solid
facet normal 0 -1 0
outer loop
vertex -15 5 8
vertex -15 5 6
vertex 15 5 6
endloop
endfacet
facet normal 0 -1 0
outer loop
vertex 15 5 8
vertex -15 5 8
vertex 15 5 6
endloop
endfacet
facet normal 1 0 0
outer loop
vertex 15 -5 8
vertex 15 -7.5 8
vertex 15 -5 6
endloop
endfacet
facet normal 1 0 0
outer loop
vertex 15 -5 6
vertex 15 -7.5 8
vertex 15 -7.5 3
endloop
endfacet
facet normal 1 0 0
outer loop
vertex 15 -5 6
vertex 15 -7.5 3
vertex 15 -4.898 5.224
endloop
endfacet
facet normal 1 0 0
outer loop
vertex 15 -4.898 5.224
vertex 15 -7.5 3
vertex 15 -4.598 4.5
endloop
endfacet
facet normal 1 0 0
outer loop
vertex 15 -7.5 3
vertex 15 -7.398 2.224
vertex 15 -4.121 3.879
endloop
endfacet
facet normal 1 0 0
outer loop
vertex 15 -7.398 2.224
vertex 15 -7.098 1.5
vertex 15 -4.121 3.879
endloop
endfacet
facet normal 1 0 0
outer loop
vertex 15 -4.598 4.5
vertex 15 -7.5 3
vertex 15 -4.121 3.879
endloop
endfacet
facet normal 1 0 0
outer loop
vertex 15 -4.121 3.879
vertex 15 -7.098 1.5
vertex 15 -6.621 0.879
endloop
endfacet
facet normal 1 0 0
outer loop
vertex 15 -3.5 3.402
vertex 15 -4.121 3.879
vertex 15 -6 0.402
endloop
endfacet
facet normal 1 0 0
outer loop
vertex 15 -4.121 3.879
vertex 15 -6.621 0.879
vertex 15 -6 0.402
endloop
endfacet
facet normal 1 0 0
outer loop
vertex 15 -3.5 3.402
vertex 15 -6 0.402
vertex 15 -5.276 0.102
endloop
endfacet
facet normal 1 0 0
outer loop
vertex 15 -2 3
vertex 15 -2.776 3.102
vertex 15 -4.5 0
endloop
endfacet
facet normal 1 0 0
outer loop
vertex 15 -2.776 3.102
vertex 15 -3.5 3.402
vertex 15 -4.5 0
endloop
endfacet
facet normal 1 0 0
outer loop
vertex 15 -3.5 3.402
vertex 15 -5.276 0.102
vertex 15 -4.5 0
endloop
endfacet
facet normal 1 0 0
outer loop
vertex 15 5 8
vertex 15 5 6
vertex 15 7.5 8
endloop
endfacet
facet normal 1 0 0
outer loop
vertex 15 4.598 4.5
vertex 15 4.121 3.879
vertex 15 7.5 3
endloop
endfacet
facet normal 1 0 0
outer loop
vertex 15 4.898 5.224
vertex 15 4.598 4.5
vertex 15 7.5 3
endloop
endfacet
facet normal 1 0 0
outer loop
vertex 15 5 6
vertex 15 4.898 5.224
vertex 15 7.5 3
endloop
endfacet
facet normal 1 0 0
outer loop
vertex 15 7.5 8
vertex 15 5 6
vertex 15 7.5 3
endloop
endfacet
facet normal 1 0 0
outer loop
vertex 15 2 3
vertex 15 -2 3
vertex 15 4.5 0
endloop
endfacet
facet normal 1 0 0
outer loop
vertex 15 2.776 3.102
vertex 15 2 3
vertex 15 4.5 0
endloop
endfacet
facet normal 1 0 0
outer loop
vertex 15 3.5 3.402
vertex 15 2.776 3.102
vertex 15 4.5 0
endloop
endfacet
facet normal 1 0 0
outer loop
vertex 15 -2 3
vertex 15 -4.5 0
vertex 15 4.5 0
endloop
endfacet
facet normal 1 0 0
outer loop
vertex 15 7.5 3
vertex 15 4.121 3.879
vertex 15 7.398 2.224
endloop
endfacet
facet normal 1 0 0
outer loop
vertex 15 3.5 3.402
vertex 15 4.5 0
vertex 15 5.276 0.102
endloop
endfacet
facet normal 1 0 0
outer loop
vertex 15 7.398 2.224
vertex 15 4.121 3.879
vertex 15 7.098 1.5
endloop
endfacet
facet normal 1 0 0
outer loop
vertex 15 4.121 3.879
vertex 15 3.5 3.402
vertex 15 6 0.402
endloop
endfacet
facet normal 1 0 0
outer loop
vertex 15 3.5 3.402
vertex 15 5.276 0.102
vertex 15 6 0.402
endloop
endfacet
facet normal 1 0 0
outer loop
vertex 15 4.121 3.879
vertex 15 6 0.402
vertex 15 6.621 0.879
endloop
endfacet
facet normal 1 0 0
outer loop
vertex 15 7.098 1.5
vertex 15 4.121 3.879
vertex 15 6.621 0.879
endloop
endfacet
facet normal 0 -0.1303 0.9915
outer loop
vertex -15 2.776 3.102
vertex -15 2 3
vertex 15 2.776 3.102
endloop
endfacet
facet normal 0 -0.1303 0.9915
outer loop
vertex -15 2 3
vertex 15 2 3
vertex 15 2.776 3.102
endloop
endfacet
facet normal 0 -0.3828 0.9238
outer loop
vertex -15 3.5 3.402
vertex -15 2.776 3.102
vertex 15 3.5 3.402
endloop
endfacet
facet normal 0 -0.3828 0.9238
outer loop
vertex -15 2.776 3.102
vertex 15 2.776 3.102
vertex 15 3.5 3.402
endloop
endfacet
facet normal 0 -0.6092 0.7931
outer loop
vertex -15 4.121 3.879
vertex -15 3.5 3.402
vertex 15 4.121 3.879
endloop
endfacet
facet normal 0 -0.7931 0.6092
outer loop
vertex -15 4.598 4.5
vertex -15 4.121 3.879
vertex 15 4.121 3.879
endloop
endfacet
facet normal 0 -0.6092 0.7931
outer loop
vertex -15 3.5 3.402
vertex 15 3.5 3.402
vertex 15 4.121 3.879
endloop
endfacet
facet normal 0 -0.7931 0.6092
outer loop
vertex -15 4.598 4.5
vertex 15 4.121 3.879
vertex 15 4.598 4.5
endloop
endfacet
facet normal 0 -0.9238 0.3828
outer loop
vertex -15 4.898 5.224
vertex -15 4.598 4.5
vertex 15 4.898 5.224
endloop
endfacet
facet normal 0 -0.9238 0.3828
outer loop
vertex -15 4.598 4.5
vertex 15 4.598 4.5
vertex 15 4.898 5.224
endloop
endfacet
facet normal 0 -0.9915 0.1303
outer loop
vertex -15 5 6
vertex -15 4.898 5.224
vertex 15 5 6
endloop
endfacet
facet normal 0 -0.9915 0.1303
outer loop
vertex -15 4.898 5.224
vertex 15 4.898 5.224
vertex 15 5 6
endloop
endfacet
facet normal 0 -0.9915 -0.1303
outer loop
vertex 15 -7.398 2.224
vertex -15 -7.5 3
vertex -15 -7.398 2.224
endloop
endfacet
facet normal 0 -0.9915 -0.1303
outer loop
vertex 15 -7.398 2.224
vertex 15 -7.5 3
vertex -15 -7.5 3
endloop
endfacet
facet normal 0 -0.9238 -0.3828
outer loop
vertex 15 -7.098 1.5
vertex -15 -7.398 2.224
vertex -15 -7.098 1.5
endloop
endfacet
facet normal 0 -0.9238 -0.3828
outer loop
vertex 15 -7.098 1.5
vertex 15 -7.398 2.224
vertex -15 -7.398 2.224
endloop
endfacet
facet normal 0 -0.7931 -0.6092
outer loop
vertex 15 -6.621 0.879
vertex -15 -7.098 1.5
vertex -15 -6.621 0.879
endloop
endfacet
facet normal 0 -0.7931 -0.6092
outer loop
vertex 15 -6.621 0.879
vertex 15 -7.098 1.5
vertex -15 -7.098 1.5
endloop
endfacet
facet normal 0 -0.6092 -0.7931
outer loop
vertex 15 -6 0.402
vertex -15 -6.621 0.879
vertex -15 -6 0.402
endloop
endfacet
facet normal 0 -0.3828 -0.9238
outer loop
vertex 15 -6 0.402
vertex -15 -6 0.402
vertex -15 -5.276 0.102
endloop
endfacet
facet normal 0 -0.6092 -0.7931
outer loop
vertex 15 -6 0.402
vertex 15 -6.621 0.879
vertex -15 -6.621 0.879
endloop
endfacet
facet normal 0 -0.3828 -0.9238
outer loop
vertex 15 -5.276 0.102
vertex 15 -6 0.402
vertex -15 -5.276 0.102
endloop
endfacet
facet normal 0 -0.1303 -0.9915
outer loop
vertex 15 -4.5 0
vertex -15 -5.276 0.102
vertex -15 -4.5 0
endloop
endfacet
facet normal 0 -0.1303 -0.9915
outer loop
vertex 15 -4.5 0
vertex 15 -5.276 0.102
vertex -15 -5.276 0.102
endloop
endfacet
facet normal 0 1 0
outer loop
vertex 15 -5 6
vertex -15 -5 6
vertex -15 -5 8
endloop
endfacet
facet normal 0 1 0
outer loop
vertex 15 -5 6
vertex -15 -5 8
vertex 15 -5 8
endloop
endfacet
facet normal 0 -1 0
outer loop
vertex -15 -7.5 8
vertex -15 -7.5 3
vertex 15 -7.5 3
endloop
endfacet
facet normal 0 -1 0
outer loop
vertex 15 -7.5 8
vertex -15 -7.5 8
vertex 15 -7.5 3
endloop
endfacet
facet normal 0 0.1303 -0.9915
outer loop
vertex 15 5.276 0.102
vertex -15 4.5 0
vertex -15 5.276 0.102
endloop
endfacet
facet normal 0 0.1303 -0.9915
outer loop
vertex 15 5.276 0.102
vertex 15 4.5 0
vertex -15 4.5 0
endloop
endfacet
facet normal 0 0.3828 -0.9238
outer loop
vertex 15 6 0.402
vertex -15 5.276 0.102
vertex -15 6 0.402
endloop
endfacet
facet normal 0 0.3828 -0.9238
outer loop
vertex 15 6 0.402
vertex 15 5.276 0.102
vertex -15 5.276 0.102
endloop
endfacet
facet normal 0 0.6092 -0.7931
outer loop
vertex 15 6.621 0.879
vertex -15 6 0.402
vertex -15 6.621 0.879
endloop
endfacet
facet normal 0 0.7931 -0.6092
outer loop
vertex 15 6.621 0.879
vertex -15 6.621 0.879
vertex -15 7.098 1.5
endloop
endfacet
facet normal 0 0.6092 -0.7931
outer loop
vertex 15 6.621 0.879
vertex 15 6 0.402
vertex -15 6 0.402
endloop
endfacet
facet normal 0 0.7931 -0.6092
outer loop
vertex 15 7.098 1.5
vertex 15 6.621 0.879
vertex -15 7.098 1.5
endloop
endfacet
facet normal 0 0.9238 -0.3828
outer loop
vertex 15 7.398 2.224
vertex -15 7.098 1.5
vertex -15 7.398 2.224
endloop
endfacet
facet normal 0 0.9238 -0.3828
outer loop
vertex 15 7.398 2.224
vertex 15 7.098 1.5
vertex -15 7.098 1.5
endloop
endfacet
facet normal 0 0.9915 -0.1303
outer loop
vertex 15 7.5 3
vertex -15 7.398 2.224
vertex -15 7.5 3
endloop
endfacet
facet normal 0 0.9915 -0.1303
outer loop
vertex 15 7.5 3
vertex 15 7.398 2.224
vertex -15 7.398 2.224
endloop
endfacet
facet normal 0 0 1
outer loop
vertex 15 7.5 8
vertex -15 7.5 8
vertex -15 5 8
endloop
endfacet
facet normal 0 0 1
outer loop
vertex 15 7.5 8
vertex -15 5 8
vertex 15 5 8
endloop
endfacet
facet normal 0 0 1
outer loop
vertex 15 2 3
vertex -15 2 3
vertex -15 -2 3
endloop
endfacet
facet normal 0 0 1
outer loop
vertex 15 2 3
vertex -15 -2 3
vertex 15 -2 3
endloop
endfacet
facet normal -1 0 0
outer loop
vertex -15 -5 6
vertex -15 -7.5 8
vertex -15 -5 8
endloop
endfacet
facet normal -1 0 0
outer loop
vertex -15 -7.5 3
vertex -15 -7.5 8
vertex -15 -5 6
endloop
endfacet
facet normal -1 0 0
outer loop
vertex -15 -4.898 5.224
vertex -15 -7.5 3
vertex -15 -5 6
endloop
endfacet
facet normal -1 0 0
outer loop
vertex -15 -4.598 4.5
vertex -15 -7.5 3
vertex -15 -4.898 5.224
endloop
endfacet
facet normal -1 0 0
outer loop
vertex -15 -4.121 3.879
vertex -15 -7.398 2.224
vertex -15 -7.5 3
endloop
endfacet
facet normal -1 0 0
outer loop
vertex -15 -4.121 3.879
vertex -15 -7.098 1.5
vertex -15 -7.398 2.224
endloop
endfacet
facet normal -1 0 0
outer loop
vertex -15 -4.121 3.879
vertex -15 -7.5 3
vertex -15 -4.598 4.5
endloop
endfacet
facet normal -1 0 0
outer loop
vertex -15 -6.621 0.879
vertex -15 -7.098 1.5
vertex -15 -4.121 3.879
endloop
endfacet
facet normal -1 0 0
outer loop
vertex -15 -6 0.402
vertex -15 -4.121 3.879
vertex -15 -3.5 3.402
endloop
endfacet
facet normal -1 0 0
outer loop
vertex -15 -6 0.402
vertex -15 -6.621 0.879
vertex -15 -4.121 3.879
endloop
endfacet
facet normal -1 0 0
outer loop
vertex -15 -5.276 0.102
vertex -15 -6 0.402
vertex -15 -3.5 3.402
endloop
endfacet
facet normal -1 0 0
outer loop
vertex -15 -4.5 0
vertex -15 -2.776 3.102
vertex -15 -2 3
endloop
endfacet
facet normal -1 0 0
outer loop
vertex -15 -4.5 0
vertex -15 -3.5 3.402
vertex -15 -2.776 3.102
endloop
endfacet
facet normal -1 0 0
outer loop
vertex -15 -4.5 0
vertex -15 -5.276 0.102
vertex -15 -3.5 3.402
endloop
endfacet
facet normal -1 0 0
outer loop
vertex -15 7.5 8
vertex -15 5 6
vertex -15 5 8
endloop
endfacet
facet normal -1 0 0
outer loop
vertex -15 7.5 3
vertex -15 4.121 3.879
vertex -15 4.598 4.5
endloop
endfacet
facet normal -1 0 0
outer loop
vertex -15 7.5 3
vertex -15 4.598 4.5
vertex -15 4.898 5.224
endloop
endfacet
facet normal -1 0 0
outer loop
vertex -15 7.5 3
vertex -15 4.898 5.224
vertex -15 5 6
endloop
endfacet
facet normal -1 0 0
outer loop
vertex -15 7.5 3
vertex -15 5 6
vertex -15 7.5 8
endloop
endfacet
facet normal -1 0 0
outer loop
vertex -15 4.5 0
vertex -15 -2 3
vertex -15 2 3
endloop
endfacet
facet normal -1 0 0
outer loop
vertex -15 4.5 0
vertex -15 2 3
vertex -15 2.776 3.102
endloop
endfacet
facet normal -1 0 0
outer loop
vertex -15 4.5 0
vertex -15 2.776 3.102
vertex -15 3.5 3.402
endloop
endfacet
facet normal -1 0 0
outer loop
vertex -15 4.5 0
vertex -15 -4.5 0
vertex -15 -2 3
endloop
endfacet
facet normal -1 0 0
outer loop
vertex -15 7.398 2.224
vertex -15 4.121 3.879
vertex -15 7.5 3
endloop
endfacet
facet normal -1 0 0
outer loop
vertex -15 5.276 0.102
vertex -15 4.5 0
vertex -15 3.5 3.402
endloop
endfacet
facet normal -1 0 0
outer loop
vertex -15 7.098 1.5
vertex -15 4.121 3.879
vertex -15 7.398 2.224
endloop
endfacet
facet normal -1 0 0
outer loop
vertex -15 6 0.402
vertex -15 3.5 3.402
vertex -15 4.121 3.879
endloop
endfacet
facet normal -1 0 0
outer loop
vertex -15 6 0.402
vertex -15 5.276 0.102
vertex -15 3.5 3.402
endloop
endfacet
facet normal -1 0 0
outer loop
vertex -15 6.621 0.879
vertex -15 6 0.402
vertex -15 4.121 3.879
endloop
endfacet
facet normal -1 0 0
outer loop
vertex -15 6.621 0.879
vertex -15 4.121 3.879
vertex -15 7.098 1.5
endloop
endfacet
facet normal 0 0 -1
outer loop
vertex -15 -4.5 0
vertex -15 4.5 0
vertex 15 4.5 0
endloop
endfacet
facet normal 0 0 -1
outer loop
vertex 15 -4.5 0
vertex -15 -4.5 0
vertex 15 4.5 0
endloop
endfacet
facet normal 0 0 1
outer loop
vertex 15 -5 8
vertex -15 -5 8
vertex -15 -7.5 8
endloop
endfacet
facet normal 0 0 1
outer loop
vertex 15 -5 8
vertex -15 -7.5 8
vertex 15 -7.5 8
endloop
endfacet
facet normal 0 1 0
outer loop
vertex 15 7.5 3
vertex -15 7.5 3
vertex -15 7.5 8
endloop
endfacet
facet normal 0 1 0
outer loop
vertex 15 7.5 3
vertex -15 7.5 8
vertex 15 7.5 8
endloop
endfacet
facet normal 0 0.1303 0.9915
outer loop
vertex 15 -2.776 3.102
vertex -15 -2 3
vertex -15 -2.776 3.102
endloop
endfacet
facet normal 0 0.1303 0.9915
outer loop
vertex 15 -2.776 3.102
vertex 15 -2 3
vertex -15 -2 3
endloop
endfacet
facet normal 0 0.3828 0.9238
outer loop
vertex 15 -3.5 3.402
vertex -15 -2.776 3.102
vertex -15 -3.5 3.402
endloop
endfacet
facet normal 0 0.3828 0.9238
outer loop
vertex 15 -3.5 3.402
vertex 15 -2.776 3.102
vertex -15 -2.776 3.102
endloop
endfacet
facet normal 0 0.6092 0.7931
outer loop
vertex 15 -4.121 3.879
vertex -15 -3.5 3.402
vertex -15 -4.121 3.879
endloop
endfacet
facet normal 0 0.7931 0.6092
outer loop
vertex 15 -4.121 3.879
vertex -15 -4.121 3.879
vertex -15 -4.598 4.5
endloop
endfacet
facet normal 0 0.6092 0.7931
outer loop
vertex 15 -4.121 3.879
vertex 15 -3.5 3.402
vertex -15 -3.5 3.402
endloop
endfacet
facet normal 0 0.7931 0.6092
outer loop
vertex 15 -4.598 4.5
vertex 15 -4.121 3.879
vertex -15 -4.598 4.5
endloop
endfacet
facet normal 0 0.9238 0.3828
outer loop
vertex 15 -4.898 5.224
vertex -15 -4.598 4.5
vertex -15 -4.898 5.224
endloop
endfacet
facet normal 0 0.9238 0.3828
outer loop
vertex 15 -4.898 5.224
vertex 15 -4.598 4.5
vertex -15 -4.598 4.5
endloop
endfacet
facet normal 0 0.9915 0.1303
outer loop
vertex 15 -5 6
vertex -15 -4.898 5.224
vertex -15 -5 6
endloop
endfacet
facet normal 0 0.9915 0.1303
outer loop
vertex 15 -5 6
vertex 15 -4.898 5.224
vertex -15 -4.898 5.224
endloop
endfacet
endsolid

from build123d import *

# Parameters (mm, degrees)
F0_W     = 30
F0_H     = 15
F1_DEPTH = 3
F2_W     = 30
F2_H     = 2.5
F3_DEPTH = 5
F4_R     = 3


with BuildPart() as f1:
    # F0 (on Top) → F1 (new body)
    with BuildSketch(Plane.XY):
        Rectangle(F0_W, F0_H)
    extrude(amount=F1_DEPTH)

    # F2 (on face) → F3 (join)
    with BuildSketch(Plane.XY.offset(3)):
        with Locations((0, 6.25)):
            Rectangle(F2_W, F2_H)
        with Locations((0, -6.25)):
            Rectangle(F2_W, F2_H)
    extrude(amount=F3_DEPTH)

    # F4
    f4_edges = [f1.edges().sort_by_distance(p)[0] for p in [
        (0, 5, 3),
        (0, -5, 3),
        (0, 7.5, 0),
        (0, -7.5, 0),
    ]]
    fillet(f4_edges, radius=F4_R)


solid = f1.part
